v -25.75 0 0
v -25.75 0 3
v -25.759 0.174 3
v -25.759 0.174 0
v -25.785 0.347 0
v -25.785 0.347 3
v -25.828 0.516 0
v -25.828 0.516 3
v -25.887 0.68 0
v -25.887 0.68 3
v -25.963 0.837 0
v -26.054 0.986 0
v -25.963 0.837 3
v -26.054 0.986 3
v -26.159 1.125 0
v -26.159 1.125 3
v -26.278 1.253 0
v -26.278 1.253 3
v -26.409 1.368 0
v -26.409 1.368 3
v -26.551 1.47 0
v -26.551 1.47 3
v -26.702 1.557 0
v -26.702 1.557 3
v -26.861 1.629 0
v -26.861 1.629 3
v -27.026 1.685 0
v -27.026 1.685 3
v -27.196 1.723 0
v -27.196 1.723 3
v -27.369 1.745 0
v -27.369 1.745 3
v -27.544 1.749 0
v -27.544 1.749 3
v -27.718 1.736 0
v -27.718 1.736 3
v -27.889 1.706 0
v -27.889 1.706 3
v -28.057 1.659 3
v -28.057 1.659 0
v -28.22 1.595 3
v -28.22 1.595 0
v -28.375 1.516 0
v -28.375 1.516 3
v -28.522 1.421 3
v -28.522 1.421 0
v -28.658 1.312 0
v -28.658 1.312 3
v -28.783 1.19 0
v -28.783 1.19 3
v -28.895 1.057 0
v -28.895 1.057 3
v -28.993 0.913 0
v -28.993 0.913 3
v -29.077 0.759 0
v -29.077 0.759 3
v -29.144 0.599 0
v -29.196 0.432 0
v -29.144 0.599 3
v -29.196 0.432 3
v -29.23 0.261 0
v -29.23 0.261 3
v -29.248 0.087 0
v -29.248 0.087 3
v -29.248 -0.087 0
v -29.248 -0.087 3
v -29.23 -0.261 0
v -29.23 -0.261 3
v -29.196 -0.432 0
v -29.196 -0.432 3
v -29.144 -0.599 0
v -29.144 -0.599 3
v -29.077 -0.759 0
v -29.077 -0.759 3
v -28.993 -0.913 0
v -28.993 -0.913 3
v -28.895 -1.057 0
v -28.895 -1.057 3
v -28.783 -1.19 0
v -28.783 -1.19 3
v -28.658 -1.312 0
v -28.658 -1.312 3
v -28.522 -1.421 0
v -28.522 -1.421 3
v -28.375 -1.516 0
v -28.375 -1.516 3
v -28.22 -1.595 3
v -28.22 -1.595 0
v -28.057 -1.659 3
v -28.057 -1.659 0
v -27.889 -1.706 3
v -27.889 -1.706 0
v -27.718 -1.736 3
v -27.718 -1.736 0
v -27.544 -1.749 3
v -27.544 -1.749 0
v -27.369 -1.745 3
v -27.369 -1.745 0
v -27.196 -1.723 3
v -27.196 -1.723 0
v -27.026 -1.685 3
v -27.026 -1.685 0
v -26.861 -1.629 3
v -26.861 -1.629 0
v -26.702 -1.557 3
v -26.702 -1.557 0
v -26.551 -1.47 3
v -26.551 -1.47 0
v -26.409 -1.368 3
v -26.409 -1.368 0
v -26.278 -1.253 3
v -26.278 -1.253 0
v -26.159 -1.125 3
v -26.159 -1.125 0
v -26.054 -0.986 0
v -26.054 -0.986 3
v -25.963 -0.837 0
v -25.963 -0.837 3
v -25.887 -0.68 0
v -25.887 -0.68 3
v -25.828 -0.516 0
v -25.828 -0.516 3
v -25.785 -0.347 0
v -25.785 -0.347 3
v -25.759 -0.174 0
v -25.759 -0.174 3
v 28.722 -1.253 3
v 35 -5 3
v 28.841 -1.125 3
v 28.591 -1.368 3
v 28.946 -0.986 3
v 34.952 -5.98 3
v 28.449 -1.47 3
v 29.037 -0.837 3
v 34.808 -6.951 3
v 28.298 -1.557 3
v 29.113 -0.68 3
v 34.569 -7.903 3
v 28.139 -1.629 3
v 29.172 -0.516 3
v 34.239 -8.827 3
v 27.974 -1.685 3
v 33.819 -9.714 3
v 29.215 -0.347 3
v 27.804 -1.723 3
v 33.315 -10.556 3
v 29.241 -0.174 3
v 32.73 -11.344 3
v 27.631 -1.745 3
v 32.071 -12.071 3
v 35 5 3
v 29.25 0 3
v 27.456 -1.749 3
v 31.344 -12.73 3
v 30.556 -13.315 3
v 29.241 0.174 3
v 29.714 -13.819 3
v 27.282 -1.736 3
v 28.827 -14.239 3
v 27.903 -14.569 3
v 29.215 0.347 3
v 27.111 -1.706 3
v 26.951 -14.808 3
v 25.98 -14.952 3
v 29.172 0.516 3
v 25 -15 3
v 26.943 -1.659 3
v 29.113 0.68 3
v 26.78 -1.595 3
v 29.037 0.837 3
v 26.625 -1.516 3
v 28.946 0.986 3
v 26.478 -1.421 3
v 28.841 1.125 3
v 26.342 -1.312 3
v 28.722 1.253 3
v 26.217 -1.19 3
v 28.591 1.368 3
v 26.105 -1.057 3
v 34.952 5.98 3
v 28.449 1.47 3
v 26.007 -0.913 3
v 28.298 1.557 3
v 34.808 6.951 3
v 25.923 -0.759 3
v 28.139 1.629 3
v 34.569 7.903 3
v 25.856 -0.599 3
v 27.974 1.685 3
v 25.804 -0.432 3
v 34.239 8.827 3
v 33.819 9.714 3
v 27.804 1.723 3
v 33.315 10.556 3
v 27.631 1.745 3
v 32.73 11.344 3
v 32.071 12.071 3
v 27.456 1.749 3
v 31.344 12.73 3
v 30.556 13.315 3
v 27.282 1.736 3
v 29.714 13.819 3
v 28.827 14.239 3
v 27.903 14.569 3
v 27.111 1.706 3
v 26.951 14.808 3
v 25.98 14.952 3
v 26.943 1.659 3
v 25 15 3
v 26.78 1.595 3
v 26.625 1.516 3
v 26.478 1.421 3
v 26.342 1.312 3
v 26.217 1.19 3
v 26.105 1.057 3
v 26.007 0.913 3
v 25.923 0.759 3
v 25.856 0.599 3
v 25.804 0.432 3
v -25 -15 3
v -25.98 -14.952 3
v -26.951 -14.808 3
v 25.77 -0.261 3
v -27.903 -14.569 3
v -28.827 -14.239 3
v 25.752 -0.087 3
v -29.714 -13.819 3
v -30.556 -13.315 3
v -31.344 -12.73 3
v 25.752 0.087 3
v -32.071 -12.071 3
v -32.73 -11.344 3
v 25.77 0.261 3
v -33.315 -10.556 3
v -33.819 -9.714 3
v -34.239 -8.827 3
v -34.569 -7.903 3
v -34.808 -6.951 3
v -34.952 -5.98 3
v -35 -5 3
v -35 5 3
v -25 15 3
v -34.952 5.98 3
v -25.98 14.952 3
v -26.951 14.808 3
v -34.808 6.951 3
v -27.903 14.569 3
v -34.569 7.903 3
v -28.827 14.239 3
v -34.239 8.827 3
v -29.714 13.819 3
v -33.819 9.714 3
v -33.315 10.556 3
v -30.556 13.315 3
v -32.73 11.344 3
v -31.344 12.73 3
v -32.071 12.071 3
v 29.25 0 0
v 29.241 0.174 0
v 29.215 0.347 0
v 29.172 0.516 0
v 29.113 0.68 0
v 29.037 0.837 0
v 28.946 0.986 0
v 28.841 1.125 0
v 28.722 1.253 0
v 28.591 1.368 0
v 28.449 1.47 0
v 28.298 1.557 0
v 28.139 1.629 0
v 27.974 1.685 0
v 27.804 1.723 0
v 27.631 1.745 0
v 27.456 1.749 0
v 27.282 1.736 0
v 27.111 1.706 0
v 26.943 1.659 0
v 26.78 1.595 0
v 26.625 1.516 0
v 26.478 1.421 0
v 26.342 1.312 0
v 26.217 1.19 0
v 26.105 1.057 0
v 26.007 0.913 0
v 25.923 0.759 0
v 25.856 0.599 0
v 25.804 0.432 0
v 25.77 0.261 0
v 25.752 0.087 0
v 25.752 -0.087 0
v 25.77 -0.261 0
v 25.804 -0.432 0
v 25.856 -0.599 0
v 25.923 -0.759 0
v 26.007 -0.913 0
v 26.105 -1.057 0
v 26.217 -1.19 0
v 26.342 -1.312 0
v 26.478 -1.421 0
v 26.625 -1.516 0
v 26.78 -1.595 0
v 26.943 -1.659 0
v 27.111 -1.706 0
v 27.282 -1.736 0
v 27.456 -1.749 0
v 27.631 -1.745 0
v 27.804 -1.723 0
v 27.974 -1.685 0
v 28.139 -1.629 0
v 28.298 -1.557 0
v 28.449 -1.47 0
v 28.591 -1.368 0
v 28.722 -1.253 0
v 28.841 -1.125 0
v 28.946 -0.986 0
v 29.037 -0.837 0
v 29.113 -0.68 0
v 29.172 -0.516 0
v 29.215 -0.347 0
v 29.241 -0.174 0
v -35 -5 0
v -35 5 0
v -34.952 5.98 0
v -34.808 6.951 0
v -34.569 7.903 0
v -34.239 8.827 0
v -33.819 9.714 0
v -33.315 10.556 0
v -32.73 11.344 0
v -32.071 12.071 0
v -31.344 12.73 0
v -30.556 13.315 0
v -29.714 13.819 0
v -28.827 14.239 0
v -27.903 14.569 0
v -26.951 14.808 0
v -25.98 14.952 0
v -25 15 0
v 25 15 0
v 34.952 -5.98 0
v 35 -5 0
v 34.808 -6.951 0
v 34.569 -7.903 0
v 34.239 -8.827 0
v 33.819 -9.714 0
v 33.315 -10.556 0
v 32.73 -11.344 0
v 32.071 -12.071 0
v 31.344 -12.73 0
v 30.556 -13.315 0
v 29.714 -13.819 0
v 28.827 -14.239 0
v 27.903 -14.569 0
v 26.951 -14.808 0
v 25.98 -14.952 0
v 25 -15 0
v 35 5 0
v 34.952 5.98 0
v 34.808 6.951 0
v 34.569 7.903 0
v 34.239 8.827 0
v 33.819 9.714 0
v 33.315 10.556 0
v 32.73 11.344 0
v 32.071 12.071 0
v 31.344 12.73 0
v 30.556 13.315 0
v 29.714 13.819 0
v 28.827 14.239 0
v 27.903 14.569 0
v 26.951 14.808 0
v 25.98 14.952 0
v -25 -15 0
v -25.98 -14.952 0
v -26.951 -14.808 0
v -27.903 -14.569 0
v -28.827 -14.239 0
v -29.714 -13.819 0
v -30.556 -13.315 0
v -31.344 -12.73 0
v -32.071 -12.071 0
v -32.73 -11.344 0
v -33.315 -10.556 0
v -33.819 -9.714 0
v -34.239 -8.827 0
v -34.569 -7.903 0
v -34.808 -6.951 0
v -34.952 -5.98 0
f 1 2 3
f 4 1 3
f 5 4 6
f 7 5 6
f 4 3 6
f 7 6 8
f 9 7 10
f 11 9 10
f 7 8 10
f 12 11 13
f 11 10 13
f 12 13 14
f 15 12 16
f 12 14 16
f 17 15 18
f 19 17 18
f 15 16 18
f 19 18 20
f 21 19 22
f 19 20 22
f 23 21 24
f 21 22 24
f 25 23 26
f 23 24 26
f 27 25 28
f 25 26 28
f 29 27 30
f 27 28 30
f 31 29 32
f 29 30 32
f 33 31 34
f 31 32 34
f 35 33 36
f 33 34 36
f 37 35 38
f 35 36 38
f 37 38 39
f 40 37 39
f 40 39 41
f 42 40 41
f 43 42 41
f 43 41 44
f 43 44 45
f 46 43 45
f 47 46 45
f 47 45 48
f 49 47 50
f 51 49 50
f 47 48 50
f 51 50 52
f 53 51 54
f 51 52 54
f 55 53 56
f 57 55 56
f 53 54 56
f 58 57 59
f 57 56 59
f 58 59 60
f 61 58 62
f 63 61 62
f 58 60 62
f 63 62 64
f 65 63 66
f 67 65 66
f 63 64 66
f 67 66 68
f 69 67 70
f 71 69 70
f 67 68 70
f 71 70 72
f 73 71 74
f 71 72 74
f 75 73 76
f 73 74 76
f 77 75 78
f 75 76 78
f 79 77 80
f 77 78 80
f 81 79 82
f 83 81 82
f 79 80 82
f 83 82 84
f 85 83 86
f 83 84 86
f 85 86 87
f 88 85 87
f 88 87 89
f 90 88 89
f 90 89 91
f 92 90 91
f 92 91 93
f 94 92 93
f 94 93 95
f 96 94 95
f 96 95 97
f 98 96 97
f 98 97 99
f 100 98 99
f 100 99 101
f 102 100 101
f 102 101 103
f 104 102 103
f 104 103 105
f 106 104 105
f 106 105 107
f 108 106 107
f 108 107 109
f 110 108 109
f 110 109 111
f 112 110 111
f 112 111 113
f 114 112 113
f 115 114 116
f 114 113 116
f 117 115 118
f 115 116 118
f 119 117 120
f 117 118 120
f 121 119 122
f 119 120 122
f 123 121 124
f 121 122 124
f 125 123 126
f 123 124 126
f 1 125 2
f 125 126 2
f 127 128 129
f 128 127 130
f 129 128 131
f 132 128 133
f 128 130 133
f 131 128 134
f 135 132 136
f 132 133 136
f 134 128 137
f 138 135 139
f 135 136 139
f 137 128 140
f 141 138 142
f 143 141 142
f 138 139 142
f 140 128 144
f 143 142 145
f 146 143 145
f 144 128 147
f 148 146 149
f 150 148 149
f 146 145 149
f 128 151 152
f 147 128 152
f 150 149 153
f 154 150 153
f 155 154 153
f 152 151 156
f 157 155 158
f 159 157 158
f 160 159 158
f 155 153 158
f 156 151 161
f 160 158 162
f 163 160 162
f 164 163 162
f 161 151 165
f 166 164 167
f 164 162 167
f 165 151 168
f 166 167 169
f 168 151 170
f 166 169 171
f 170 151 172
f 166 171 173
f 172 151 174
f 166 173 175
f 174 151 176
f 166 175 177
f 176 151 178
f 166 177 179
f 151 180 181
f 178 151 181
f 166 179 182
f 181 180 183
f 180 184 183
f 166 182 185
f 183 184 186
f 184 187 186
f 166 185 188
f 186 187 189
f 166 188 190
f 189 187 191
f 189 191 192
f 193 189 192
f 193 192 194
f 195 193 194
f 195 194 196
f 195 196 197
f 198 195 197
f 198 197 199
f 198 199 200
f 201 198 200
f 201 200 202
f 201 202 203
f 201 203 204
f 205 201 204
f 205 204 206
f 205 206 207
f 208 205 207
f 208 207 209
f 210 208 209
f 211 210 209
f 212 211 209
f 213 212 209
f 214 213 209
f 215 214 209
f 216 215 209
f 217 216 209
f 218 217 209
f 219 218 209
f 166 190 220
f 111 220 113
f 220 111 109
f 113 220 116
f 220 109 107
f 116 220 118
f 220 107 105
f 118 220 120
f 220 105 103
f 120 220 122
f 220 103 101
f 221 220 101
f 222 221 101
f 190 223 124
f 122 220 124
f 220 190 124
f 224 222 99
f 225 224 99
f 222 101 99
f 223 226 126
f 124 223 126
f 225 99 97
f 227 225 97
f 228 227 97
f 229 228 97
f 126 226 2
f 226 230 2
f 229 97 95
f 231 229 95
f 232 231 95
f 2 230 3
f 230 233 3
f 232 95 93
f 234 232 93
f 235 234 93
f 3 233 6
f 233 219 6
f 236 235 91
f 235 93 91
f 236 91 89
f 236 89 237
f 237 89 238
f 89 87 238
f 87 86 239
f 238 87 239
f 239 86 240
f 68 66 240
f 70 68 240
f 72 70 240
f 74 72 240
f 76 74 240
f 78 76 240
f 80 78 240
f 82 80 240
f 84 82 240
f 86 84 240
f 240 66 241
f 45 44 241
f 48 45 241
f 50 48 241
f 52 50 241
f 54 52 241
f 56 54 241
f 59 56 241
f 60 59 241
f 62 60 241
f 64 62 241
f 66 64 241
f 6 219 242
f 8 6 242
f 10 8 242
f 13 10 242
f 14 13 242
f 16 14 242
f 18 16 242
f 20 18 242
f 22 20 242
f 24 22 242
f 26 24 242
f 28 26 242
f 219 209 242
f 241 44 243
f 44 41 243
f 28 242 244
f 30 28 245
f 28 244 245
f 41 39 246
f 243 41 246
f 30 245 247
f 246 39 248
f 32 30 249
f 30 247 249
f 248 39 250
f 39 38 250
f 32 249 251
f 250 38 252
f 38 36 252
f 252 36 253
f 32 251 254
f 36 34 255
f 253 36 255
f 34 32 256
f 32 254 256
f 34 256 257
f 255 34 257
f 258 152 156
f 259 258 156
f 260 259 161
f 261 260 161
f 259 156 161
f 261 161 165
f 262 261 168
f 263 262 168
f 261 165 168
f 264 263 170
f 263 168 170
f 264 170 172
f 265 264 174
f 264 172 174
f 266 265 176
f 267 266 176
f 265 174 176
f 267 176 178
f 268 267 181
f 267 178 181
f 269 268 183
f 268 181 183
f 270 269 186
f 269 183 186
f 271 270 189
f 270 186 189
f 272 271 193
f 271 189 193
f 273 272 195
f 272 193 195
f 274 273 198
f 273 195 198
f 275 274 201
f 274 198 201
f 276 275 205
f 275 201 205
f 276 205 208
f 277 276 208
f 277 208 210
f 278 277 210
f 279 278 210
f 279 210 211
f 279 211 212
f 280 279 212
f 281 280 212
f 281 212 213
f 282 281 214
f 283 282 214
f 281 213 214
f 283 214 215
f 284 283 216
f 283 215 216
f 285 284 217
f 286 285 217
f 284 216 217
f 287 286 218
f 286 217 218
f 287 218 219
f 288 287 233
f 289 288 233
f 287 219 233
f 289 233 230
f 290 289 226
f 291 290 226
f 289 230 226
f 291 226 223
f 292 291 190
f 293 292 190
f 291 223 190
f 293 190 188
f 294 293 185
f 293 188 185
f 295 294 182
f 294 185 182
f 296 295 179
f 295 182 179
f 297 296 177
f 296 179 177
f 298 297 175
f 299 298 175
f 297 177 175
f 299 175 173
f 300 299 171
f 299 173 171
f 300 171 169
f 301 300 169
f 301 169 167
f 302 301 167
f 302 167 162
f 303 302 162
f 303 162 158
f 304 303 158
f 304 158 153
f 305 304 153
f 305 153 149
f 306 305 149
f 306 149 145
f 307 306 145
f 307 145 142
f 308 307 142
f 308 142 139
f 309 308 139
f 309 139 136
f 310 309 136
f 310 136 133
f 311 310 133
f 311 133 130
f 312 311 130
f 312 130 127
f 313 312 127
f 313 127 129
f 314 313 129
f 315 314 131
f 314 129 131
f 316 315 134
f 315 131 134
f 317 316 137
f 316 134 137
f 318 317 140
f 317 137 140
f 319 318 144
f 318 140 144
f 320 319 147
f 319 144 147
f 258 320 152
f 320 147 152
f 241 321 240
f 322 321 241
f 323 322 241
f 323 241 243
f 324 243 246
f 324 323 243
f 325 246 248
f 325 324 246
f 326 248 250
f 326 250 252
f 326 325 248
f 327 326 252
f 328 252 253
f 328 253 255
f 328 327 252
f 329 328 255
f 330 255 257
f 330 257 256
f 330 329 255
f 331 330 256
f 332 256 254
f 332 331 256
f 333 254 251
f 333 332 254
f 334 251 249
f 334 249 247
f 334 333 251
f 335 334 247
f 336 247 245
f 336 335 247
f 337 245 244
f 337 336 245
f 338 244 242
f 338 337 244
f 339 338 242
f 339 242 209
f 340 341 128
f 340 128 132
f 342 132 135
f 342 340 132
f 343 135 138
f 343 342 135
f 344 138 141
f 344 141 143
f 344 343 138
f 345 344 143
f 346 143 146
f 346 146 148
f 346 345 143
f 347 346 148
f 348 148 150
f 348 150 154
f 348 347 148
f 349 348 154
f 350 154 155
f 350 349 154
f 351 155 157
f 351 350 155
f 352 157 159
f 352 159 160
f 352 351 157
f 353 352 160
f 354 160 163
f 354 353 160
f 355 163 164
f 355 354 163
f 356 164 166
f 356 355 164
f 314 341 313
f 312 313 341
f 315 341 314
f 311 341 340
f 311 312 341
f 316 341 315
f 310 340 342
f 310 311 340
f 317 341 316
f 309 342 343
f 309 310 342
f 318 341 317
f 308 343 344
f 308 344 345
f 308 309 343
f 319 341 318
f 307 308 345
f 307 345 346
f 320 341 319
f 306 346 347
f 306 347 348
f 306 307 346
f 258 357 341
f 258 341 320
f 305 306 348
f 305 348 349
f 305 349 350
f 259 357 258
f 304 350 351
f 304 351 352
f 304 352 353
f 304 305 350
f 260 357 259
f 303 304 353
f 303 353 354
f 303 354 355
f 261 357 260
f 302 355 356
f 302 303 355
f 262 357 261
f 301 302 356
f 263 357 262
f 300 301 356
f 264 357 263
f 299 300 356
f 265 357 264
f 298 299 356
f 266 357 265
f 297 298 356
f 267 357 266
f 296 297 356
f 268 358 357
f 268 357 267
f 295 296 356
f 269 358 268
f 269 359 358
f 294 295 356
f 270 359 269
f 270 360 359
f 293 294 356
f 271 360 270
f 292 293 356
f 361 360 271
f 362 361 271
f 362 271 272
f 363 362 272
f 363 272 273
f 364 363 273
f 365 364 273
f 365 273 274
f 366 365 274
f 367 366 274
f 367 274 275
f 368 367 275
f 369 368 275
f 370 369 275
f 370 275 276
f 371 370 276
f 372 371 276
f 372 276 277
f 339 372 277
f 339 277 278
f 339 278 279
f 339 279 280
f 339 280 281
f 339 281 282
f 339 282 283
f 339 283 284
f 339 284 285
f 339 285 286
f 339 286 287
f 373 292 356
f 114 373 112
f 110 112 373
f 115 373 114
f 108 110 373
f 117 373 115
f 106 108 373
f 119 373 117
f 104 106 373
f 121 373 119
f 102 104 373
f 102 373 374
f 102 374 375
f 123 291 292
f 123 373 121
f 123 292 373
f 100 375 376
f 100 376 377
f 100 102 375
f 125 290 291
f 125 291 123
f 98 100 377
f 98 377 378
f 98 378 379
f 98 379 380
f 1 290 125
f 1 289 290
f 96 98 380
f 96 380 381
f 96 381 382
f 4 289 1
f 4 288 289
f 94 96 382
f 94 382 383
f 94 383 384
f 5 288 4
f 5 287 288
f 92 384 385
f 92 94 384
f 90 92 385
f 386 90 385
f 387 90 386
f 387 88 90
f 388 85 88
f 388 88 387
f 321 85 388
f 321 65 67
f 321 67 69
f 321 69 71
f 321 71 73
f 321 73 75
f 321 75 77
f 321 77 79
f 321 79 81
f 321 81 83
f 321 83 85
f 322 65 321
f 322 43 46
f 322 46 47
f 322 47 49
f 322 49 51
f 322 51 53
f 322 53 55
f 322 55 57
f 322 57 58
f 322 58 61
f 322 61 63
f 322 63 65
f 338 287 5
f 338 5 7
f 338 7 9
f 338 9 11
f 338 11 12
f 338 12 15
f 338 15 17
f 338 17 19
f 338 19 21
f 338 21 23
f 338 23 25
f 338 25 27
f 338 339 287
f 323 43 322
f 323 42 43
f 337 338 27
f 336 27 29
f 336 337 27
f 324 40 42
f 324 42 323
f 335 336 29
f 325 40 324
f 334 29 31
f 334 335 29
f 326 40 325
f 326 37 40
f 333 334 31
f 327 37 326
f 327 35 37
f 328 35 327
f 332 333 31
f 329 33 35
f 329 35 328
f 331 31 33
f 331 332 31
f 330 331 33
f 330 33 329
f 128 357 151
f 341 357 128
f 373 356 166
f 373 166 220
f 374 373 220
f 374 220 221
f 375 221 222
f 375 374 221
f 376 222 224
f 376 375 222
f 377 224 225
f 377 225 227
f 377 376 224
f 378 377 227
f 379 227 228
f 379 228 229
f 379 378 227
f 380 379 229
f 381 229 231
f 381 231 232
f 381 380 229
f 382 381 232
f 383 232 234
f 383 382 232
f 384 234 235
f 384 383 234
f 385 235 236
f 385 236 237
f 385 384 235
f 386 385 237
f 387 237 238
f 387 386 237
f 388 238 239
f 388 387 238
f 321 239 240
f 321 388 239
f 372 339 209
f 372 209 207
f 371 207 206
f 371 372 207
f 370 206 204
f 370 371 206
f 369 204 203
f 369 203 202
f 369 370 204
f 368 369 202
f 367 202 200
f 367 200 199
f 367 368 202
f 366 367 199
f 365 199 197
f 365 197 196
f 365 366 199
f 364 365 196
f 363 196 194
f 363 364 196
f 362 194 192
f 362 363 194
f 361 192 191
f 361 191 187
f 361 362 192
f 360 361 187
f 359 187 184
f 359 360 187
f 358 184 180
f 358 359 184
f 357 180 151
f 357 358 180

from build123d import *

# Parameters (mm, degrees)
BOSS_EXTRUDE1_DEPTH = 3
SKETCH2_R           = 1.75
CUT_EXTRUDE1_DEPTH  = 3


with BuildPart() as part:
    # Sketch1 → Boss-Extrude1 (new body)
    with BuildSketch(Plane.XY):
        with BuildLine():
            Line((-25, 15), (25, 15))
            ThreePointArc((25, 15), (32.071067812, 12.071067812), (35, 5))
            Line((35, 5), (35, -5))
            ThreePointArc((35, -5), (32.071067812, -12.071067812), (25, -15))
            Line((25, -15), (-25, -15))
            ThreePointArc((-25, -15), (-32.071067812, -12.071067812), (-35, -5))
            Line((-35, -5), (-35, 5))
            ThreePointArc((-35, 5), (-32.071067812, 12.071067812), (-25, 15))
        make_face()
    extrude(amount=BOSS_EXTRUDE1_DEPTH)

    # Sketch2 → Cut-Extrude1 (cut)
    with BuildSketch(Plane.XY.offset(3)):
        with Locations((-27.5, 0)):
            Circle(SKETCH2_R)
        with Locations((27.5, 0)):
            Circle(SKETCH2_R)
    extrude(amount=-CUT_EXTRUDE1_DEPTH, mode=Mode.SUBTRACT)


solid = part.part
